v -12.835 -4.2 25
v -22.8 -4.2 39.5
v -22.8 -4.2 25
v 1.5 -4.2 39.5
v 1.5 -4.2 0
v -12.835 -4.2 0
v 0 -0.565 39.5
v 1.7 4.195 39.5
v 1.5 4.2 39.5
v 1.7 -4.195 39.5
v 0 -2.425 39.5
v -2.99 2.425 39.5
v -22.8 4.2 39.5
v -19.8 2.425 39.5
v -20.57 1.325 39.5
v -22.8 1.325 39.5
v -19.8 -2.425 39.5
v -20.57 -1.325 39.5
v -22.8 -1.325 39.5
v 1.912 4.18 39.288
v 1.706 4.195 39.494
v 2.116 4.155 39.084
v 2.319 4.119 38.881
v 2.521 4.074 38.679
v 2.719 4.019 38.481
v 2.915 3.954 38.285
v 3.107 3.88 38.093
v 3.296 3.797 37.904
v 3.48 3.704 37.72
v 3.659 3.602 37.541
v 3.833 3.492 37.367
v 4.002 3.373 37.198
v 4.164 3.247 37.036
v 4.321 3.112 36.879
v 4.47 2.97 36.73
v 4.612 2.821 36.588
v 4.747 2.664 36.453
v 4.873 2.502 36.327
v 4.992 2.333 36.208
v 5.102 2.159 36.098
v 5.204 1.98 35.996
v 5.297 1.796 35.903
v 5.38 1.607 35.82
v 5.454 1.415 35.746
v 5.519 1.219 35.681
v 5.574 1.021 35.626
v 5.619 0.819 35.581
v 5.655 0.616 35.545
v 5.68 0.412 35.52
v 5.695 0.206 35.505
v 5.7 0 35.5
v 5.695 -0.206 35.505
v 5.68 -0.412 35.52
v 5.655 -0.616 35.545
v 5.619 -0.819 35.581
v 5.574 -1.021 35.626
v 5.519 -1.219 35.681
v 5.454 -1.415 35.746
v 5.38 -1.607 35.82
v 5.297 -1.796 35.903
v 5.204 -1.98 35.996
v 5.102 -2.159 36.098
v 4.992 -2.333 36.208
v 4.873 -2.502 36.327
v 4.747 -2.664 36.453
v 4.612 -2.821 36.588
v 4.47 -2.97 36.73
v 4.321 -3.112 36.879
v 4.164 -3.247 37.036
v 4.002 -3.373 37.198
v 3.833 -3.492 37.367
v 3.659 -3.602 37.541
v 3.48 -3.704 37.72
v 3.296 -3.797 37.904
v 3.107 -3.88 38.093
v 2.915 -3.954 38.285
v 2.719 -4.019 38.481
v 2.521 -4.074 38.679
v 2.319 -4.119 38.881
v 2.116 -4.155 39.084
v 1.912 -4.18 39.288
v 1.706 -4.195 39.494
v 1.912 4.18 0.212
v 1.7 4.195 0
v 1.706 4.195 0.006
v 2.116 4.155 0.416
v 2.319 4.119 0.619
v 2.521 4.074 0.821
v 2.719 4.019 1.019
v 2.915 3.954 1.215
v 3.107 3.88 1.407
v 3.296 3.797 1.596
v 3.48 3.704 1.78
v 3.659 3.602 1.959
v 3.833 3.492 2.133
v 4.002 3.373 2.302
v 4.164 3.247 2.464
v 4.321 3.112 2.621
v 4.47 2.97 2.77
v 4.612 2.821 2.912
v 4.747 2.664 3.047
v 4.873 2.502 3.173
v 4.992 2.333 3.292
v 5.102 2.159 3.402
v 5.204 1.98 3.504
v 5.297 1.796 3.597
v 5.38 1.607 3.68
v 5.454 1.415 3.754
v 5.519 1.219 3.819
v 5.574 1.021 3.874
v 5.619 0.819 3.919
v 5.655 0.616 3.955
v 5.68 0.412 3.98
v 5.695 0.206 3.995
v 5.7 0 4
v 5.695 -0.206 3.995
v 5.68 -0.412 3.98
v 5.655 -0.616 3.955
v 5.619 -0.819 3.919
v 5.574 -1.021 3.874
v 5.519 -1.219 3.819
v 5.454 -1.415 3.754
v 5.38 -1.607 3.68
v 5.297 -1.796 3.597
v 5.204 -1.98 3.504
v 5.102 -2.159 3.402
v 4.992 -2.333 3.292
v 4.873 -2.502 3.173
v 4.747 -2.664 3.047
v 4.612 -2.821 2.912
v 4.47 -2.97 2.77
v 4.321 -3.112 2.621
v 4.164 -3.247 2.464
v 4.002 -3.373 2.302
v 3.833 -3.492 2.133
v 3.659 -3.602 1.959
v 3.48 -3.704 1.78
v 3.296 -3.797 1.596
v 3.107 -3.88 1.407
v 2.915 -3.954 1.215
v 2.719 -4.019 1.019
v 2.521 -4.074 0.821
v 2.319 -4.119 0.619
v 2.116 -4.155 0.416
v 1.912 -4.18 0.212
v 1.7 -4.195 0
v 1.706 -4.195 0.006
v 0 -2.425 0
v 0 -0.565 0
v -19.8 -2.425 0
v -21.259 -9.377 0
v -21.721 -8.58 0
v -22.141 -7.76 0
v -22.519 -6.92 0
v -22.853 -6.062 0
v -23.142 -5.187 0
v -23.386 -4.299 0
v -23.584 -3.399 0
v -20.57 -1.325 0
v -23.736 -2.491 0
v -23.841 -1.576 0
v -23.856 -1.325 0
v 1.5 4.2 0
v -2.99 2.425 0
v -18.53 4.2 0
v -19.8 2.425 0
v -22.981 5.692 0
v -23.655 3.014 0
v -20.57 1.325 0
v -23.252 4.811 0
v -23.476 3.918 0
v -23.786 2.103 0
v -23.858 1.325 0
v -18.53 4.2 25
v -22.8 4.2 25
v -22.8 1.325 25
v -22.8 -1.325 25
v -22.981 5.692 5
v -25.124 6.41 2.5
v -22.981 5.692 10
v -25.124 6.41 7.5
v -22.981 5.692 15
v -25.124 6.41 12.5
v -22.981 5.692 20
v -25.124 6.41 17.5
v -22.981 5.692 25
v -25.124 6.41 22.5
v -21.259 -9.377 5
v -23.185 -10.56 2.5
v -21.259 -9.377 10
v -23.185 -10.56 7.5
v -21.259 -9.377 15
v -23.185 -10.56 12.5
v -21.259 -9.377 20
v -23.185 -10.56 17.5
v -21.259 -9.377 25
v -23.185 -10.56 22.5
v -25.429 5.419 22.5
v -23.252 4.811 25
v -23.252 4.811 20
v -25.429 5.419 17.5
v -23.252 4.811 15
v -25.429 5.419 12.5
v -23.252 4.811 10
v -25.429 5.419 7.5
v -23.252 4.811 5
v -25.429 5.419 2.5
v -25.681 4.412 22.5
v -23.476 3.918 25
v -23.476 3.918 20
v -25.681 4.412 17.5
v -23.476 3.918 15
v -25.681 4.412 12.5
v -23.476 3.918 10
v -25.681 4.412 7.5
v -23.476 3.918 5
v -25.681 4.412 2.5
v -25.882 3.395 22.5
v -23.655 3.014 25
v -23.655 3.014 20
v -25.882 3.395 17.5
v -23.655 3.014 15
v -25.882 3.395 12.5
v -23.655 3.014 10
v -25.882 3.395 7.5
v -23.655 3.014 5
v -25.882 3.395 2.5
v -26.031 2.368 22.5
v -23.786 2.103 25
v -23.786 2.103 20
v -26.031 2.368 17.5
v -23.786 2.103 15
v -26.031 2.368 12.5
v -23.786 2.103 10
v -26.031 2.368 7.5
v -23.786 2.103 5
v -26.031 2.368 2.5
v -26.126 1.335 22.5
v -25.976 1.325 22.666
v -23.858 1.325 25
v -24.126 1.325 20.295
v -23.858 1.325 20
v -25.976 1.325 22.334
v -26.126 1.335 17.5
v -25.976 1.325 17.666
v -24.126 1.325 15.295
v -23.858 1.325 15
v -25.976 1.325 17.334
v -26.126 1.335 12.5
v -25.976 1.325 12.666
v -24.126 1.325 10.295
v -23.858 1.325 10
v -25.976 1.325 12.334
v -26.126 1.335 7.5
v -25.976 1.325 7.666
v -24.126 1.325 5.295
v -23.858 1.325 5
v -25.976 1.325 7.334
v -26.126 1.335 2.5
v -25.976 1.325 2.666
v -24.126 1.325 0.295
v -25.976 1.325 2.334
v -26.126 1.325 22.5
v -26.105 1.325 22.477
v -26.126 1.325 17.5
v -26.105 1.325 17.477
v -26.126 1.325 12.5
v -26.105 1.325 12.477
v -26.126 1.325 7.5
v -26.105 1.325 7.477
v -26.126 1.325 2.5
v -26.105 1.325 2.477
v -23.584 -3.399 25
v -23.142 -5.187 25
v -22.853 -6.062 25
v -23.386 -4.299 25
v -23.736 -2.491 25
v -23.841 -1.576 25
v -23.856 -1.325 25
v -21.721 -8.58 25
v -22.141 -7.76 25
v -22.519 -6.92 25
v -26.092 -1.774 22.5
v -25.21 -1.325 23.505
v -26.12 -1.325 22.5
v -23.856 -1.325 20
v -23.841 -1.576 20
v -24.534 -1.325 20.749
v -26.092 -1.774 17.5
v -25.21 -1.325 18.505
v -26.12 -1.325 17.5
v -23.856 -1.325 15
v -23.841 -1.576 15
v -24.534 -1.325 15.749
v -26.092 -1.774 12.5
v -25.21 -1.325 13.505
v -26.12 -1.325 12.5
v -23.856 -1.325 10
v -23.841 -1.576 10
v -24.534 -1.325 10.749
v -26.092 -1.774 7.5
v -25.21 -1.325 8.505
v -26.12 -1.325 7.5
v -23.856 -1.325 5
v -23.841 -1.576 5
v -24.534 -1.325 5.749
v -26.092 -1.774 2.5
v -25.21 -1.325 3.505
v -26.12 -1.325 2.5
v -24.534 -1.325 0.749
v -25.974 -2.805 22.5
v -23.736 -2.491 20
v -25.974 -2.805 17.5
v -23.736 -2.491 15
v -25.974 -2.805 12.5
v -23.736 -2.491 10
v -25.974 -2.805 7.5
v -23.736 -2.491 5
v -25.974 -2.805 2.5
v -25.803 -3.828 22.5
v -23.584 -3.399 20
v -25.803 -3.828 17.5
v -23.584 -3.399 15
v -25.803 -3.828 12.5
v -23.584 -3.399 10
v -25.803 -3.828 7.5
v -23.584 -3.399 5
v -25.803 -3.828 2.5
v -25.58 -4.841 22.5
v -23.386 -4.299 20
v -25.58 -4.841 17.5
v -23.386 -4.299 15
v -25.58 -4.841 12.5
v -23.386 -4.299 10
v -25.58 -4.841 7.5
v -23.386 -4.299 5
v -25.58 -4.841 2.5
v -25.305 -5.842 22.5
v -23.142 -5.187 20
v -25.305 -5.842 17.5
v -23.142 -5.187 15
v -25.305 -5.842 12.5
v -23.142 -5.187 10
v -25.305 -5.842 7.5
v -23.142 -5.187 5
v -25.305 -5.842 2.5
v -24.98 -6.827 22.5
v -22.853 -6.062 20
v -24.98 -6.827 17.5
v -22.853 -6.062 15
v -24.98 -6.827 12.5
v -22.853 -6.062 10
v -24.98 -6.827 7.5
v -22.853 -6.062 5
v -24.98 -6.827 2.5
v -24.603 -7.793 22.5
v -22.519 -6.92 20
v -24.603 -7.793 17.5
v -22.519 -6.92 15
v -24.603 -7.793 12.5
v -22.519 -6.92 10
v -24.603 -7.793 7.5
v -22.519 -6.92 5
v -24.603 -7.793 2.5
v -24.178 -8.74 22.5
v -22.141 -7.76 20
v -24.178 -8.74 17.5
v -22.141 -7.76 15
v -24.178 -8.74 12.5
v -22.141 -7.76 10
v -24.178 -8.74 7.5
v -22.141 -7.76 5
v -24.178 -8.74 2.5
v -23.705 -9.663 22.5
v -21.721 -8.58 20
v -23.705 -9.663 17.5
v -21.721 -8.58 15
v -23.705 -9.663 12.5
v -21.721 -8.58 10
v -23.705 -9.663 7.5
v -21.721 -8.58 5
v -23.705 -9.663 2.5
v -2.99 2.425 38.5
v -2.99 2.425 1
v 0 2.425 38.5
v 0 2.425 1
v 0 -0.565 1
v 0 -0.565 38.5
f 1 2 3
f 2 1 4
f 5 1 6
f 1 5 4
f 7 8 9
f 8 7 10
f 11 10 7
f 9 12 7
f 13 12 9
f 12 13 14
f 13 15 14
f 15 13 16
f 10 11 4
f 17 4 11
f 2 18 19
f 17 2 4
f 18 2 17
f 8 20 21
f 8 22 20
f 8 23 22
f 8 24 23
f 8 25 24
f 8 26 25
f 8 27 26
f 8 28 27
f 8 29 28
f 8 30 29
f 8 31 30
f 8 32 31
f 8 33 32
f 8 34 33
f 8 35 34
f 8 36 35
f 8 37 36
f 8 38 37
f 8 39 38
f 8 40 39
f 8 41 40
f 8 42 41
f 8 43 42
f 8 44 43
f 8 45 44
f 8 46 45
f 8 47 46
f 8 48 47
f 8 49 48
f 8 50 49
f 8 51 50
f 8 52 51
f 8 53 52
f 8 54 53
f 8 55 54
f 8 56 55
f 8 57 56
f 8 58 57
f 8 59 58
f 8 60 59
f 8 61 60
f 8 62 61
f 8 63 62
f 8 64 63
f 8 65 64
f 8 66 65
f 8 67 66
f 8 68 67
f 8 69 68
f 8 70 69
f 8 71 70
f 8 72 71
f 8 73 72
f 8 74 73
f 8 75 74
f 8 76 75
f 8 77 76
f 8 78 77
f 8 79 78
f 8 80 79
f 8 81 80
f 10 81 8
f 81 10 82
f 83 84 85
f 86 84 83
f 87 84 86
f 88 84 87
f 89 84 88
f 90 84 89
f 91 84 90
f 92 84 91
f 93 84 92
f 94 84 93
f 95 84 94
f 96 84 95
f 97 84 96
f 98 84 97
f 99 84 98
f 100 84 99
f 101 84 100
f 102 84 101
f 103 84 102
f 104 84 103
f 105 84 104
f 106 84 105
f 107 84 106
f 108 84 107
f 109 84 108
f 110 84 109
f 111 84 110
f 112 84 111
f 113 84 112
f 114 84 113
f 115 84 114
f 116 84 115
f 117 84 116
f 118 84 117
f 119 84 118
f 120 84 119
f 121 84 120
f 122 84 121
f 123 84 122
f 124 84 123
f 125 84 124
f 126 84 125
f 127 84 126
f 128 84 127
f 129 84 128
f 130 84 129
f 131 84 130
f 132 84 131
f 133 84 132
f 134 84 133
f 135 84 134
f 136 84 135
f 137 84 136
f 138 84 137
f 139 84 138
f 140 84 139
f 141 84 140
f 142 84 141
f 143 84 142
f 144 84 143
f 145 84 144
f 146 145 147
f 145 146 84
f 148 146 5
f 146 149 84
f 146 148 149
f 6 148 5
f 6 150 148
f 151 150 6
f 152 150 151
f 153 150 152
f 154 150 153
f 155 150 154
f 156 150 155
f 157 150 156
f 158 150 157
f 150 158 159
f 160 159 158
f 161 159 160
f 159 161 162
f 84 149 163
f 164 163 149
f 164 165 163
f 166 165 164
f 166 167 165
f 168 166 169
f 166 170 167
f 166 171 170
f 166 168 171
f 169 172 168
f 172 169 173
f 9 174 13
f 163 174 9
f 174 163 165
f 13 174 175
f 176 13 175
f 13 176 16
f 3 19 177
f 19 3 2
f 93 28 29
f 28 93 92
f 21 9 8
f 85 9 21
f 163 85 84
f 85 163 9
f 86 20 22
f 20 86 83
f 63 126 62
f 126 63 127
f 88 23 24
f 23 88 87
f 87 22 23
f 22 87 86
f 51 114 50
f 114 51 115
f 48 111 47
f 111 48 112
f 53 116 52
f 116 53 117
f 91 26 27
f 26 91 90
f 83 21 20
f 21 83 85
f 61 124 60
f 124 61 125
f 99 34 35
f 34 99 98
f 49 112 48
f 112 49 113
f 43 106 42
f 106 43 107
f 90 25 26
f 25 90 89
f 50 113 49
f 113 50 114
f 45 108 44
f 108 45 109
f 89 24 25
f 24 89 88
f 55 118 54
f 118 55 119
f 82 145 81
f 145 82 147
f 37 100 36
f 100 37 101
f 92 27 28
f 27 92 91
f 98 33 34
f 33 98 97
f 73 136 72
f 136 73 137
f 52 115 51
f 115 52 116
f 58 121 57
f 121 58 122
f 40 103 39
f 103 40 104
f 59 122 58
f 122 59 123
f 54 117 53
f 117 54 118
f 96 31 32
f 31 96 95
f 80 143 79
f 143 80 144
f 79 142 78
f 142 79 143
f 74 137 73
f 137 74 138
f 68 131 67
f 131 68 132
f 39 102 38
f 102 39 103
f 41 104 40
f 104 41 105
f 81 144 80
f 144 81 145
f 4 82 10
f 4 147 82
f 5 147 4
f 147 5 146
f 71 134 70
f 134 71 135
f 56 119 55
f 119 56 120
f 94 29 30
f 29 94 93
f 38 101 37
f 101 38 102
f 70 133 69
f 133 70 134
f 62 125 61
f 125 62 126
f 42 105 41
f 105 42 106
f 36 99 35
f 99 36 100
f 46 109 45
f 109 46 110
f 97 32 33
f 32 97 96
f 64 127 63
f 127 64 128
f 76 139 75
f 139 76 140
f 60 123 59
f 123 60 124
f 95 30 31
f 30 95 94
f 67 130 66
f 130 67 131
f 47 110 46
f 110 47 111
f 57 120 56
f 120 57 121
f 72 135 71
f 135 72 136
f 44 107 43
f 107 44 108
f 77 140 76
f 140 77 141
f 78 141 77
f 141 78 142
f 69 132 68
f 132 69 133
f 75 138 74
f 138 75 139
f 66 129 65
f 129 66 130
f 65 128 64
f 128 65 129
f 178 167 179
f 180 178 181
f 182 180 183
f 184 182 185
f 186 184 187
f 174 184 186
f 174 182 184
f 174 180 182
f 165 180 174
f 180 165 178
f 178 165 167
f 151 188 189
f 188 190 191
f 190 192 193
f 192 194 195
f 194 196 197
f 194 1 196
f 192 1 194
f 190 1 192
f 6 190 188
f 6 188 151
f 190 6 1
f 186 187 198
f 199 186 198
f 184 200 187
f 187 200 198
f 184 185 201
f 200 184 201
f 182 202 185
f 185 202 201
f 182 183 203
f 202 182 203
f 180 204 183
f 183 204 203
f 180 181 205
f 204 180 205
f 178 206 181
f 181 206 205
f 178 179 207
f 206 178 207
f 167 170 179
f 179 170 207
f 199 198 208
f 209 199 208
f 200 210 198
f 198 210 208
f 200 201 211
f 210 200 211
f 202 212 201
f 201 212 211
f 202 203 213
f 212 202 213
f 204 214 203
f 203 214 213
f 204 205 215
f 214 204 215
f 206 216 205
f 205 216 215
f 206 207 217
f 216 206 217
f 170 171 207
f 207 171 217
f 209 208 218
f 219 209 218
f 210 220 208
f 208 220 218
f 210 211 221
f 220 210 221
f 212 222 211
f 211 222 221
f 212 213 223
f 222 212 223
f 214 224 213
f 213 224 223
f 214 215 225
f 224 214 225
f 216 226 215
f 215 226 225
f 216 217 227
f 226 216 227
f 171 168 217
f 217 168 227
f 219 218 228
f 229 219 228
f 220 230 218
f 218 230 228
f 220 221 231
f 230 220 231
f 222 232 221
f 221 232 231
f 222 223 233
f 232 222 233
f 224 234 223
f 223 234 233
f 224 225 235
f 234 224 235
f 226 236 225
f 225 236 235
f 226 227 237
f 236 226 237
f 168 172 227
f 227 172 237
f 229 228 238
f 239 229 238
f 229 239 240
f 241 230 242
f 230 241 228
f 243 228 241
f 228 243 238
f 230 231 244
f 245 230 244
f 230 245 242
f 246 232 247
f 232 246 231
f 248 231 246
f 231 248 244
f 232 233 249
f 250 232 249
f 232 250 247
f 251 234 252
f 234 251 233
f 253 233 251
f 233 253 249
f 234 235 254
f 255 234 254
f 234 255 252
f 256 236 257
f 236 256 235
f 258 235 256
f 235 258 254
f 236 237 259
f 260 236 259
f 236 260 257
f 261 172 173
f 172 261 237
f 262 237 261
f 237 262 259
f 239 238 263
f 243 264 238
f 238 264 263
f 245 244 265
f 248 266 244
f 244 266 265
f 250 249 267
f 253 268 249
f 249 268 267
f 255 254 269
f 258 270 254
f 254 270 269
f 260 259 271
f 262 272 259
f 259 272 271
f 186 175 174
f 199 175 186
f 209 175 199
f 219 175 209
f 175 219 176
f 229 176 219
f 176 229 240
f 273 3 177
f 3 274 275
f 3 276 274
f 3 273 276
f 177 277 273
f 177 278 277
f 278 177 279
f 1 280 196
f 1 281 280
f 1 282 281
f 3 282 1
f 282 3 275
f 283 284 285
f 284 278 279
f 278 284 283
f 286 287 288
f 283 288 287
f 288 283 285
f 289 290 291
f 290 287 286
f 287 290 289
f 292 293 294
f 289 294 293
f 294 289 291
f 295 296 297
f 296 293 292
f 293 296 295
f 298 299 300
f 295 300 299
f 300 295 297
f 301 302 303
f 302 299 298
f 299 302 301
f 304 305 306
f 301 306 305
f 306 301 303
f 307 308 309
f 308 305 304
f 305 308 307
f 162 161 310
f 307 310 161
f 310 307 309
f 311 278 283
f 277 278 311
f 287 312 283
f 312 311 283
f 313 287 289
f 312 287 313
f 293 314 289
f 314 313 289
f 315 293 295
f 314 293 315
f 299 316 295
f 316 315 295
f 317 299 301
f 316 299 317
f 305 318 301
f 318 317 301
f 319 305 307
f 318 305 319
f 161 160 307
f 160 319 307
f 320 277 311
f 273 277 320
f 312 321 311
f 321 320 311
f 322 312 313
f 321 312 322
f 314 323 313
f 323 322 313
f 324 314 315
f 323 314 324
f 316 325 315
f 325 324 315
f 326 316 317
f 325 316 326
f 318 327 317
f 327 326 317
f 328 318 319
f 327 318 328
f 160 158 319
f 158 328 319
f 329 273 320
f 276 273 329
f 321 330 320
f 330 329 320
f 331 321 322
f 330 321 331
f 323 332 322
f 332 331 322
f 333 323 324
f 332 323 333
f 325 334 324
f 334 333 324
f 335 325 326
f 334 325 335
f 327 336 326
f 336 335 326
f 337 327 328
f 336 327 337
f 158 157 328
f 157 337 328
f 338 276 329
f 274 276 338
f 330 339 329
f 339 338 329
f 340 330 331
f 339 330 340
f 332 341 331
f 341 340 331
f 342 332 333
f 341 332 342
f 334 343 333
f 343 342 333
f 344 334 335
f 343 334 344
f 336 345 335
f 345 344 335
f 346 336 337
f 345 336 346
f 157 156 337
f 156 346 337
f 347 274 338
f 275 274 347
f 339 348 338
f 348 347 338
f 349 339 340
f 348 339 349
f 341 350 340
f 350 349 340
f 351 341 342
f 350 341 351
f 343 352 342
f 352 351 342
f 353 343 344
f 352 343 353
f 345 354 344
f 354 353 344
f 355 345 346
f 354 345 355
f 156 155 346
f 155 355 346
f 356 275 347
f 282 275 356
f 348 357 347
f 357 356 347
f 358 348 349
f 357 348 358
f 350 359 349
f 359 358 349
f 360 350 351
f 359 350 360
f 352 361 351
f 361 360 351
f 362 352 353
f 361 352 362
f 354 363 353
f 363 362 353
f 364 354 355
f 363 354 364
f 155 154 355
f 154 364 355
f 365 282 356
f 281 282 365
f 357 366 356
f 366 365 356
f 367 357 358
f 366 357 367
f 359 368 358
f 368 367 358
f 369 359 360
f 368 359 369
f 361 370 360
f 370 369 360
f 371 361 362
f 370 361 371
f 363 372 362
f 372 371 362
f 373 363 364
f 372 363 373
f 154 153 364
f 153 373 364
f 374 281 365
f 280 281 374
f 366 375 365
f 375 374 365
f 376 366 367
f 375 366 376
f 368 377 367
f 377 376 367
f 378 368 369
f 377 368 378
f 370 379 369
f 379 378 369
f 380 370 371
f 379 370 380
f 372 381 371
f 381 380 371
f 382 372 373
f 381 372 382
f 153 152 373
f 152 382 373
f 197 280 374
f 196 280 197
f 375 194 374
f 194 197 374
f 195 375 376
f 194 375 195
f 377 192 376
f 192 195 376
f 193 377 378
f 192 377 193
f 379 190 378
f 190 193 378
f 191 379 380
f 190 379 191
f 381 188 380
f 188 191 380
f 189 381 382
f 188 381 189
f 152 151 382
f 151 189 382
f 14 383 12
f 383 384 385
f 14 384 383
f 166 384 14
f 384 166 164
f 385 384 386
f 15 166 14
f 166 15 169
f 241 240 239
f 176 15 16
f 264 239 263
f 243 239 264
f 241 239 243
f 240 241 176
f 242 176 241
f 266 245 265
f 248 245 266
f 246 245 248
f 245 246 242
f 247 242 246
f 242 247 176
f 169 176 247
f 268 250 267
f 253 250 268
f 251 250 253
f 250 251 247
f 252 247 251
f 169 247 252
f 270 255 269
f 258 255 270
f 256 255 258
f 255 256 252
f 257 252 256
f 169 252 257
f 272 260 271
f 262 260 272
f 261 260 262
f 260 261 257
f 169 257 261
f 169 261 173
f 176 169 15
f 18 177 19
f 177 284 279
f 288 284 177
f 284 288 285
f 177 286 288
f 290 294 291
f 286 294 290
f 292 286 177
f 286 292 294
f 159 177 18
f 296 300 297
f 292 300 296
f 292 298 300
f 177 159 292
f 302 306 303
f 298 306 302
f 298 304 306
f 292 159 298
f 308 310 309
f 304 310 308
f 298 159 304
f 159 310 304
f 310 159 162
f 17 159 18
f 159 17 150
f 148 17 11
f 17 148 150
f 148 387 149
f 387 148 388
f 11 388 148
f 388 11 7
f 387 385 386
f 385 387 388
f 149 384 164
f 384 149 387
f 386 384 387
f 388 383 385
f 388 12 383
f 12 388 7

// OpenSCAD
left = true;
// oem is 35.5
tabWidth = 39.5;
tabThickness = 8.4;
vaneThickness = 4.45;
vaneTolerance = 0.2;
extraBehindVane = 3;
extraInFrontOfVane = 1.5;
vaneSnapSize = 1.1;
vaneDepth = 19.4;
maxFrontOfVaneToGear = 26.16;
minFrontOfVaneToGear = 23.9;
axleFromFrontOfVane = 6;
gearTolerance = 0.2;
// 0=left, 0.5=center, 1=right (assuming left=true; otherwise, mirrored)
toothPositioning = 0;
toothSpacing = 5;
numberOfTeeth = 5; 
topToothHeight = 6;
bottomToothHeight = 11;
blockerLength = 1;
blockerChamfer = 3;
outerChamfer = 4;

module dumm() {}

nudge = 0.01;
vaneThickness1 = vaneThickness + 2 * vaneTolerance;
vaneDepth1 = vaneDepth + 2 * vaneTolerance;
$fn = 128;
toothEndAngle = atan2(bottomToothHeight,(minFrontOfVaneToGear-axleFromFrontOfVane));
toothStartAngle = -atan2(topToothHeight,(minFrontOfVaneToGear-axleFromFrontOfVane));

// 0,0 = front of vane, centered

module outerChamfer() {
    d = outerChamfer;
    x = tabThickness/2+extraInFrontOfVane;
    rotate([90,0,0])
    linear_extrude(center=true,height=tabThickness) polygon([[-100,0],[x-d,0],[x,d],[x,tabWidth-d],[x-d,tabWidth],[-100,tabWidth]]);
}

module outerProfile() {
    intersection() {
        outerChamfer();
        linear_extrude(height=tabWidth)
            translate([-vaneDepth1,0])
            hull() {
                translate([-extraBehindVane,-tabThickness/2]) square([1,tabThickness]);
                translate([vaneDepth1+extraInFrontOfVane,0]) circle(d=tabThickness);
            }
    }
}

function doubleProfile(polyHalf) = 
    let(n=len(polyHalf))
    concat(polyHalf, [for (i=[0:n-1]) 
        [polyHalf[n-1-i][0],-polyHalf[n-1-i][1]]]);
    
module toothProfile() {
    short = minFrontOfVaneToGear;
    long = maxFrontOfVaneToGear;
    teethSize = toothSpacing*numberOfTeeth;
    spine = [ [ axleFromFrontOfVane, teethSize ], [ axleFromFrontOfVane, 0 ] ];
    n = 2*numberOfTeeth+1;
    teeth = [ for(i=[0:n-1]) 
         [ i % 2 == 0 ? short : long, teethSize*i/(n-1) ]  ];
    translate([0,toothPositioning*(tabWidth-teethSize)])
    polygon(concat(teeth,spine)); 
}

module innerProfile() {
    bottom = [
        [ -100,-vaneThickness1/2+vaneSnapSize ], 
        [ -vaneSnapSize*.7, -vaneThickness1/2+vaneSnapSize ],
        [ 0, -vaneThickness1/2 ],
        [ vaneDepth1, -vaneThickness1/2 ],
    ];
    translate([-vaneDepth1,0]) polygon(doubleProfile(bottom));
}

module blocker() {
    linear_extrude(height=blockerLength) 
    polygon( [[  nudge, vaneThickness1/2-blockerChamfer ],
             [  nudge, vaneThickness1/2+nudge ],
             [ -blockerChamfer, vaneThickness1/2+nudge ]] );
}

module main() {
    difference() {
        union() {
            outerProfile();
            translate([-axleFromFrontOfVane,0]) 
            rotate([0,0,180+toothStartAngle])
            rotate_extrude(angle=toothEndAngle-toothStartAngle)  translate([nudge-axleFromFrontOfVane,0]) toothProfile();
        }
        translate([0,0,-nudge]) linear_extrude(height=tabWidth+2*nudge) innerProfile();
    }
    blocker();
    translate([0,0,tabWidth-blockerLength]) blocker();
}


if (left) 
    main();
else
    mirror([1,0,0]) main();
//toothProfile();
